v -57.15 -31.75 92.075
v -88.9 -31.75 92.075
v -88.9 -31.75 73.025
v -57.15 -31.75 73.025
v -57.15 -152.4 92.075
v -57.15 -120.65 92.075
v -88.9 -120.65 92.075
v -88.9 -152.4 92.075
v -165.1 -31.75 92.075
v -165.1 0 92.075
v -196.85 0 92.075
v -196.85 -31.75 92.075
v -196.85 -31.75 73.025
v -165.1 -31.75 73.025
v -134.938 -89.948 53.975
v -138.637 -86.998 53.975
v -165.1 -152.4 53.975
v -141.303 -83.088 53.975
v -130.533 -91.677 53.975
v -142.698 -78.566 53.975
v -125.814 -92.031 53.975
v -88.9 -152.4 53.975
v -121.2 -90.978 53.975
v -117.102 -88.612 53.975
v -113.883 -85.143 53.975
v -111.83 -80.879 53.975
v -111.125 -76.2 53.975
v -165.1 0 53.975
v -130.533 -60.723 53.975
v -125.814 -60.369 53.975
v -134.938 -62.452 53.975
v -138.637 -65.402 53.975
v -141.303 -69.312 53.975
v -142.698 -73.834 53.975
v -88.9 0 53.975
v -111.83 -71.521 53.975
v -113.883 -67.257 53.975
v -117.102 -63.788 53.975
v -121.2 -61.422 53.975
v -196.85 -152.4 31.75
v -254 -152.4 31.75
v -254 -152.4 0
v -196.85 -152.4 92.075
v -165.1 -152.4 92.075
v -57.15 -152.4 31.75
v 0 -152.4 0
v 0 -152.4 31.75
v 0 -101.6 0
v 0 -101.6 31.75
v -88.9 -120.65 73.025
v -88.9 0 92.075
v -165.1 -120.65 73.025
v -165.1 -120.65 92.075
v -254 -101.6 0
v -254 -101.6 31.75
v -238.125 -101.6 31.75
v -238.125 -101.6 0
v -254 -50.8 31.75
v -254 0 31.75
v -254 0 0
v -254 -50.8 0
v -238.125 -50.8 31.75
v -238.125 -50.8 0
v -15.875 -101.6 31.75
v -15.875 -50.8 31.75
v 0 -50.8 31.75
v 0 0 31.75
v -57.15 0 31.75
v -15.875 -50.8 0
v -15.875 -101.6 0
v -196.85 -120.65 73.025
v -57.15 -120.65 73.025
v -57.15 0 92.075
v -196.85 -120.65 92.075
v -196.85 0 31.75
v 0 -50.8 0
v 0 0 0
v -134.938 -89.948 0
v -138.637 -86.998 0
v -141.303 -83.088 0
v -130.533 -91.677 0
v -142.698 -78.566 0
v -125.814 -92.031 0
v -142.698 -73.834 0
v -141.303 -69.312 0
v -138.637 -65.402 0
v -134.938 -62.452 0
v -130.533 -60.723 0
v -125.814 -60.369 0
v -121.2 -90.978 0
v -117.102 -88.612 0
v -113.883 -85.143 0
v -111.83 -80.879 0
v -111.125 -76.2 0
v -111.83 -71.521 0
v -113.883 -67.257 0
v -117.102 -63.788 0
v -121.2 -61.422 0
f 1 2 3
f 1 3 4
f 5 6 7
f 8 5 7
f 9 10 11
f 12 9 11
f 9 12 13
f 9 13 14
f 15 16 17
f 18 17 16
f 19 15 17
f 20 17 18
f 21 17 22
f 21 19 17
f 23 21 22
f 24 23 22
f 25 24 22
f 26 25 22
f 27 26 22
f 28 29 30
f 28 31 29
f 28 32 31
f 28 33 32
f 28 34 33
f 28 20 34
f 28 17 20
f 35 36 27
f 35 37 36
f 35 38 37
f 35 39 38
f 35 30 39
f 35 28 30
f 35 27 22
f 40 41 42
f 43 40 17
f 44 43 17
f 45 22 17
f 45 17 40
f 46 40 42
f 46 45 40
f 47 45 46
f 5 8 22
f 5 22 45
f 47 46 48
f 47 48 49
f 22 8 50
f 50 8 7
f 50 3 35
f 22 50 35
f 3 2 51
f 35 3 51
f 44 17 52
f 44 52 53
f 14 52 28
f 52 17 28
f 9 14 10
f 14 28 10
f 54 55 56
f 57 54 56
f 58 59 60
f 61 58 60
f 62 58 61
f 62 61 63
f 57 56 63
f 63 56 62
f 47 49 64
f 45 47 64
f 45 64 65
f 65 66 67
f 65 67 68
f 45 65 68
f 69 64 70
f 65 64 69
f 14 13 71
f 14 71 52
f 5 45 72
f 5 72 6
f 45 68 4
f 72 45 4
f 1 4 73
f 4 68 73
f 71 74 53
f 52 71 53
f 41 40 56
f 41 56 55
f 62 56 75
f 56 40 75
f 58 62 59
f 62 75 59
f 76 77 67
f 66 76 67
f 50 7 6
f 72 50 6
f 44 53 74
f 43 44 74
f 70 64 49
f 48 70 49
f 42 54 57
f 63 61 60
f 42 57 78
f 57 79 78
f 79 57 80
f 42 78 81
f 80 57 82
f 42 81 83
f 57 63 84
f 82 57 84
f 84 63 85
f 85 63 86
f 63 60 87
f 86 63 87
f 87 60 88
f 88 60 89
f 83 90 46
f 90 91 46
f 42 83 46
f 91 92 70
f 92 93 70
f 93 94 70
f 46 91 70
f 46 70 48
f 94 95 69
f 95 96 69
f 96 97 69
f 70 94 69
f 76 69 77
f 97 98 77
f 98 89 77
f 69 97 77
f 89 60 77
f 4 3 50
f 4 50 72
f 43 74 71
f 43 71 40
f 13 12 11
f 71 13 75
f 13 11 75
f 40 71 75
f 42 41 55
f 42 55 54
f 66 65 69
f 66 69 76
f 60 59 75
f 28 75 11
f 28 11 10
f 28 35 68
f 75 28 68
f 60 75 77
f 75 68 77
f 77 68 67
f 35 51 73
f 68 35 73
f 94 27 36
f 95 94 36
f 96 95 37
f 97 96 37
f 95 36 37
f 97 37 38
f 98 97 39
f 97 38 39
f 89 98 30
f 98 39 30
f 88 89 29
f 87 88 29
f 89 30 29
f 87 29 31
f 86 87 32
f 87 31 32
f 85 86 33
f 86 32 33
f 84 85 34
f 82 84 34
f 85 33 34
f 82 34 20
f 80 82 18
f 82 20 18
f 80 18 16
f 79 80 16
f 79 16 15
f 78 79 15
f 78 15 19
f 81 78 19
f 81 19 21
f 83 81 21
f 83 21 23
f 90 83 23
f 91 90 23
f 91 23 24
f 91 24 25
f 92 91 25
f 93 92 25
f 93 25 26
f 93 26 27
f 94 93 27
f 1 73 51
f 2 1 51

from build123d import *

# Parameters (mm, degrees)
F1_DEPTH  = 152.4
F2_W      = 15.875
F2_H      = 50.8
F3_DEPTH  = 31.751
F4_W      = 15.875
F4_H      = 50.8
F5_DEPTH  = 31.751
F6_W      = 76.2
F6_H      = 152.4
F7_DEPTH  = 19.05
F9_W      = 31.75
F9_H      = 88.9
F10_DEPTH = 19.05
F8_W      = 31.75
F8_H      = 88.9
F11_DEPTH = 19.05
F12_R     = 15.875
F13_DEPTH = 53.976


with BuildPart() as f1:
    # F0 (on Front) → F1 (new body)
    with BuildSketch(Plane.XZ):
        Polygon((-127, 0), (0, 0), (0, 31.75), (-57.15, 31.75), (-57.15, 92.075), (-88.9, 92.075), (-88.9, 73.025), (-165.1, 73.025), (-165.1, 92.075), (-196.85, 92.075), (-196.85, 31.75), (-254, 31.75), (-254, 0), align=None)
    extrude(amount=F1_DEPTH)

    # F2 (on face) → F3 (cut, through all)
    with BuildSketch(Plane.XY.offset(31.75)):
        with Locations((-7.9375, -76.2)):
            Rectangle(F2_W, F2_H)
    extrude(amount=-F3_DEPTH, mode=Mode.SUBTRACT)

    # F4 (on face) → F5 (cut, through all)
    with BuildSketch(Plane.XY.offset(31.75)):
        with Locations((-246.0625, -76.2)):
            Rectangle(F4_W, F4_H)
    extrude(amount=-F5_DEPTH, mode=Mode.SUBTRACT)

    # F6 (on face) → F7 (cut)
    with BuildSketch(Plane.XY.offset(73.025)):
        with Locations((-127, -76.2)):
            Rectangle(F6_W, F6_H)
    extrude(amount=-F7_DEPTH, mode=Mode.SUBTRACT)

    # F9 (on face) → F10 (cut)
    with BuildSketch(Plane.XY.offset(92.075)):
        with Locations((-73.025, -76.2)):
            Rectangle(F9_W, F9_H)
    extrude(amount=-F10_DEPTH, mode=Mode.SUBTRACT)

    # F8 (on face) → F11 (cut)
    with BuildSketch(Plane.XY.offset(92.075)):
        with Locations((-180.975, -76.2)):
            Rectangle(F8_W, F8_H)
    extrude(amount=-F11_DEPTH, mode=Mode.SUBTRACT)

    # F12 (on face) → F13 (cut, through all)
    with BuildSketch(Plane.XY.offset(53.975)):
        with Locations((-127, -76.2)):
            Circle(F12_R)
    extrude(amount=-F13_DEPTH, mode=Mode.SUBTRACT)


solid = f1.part
